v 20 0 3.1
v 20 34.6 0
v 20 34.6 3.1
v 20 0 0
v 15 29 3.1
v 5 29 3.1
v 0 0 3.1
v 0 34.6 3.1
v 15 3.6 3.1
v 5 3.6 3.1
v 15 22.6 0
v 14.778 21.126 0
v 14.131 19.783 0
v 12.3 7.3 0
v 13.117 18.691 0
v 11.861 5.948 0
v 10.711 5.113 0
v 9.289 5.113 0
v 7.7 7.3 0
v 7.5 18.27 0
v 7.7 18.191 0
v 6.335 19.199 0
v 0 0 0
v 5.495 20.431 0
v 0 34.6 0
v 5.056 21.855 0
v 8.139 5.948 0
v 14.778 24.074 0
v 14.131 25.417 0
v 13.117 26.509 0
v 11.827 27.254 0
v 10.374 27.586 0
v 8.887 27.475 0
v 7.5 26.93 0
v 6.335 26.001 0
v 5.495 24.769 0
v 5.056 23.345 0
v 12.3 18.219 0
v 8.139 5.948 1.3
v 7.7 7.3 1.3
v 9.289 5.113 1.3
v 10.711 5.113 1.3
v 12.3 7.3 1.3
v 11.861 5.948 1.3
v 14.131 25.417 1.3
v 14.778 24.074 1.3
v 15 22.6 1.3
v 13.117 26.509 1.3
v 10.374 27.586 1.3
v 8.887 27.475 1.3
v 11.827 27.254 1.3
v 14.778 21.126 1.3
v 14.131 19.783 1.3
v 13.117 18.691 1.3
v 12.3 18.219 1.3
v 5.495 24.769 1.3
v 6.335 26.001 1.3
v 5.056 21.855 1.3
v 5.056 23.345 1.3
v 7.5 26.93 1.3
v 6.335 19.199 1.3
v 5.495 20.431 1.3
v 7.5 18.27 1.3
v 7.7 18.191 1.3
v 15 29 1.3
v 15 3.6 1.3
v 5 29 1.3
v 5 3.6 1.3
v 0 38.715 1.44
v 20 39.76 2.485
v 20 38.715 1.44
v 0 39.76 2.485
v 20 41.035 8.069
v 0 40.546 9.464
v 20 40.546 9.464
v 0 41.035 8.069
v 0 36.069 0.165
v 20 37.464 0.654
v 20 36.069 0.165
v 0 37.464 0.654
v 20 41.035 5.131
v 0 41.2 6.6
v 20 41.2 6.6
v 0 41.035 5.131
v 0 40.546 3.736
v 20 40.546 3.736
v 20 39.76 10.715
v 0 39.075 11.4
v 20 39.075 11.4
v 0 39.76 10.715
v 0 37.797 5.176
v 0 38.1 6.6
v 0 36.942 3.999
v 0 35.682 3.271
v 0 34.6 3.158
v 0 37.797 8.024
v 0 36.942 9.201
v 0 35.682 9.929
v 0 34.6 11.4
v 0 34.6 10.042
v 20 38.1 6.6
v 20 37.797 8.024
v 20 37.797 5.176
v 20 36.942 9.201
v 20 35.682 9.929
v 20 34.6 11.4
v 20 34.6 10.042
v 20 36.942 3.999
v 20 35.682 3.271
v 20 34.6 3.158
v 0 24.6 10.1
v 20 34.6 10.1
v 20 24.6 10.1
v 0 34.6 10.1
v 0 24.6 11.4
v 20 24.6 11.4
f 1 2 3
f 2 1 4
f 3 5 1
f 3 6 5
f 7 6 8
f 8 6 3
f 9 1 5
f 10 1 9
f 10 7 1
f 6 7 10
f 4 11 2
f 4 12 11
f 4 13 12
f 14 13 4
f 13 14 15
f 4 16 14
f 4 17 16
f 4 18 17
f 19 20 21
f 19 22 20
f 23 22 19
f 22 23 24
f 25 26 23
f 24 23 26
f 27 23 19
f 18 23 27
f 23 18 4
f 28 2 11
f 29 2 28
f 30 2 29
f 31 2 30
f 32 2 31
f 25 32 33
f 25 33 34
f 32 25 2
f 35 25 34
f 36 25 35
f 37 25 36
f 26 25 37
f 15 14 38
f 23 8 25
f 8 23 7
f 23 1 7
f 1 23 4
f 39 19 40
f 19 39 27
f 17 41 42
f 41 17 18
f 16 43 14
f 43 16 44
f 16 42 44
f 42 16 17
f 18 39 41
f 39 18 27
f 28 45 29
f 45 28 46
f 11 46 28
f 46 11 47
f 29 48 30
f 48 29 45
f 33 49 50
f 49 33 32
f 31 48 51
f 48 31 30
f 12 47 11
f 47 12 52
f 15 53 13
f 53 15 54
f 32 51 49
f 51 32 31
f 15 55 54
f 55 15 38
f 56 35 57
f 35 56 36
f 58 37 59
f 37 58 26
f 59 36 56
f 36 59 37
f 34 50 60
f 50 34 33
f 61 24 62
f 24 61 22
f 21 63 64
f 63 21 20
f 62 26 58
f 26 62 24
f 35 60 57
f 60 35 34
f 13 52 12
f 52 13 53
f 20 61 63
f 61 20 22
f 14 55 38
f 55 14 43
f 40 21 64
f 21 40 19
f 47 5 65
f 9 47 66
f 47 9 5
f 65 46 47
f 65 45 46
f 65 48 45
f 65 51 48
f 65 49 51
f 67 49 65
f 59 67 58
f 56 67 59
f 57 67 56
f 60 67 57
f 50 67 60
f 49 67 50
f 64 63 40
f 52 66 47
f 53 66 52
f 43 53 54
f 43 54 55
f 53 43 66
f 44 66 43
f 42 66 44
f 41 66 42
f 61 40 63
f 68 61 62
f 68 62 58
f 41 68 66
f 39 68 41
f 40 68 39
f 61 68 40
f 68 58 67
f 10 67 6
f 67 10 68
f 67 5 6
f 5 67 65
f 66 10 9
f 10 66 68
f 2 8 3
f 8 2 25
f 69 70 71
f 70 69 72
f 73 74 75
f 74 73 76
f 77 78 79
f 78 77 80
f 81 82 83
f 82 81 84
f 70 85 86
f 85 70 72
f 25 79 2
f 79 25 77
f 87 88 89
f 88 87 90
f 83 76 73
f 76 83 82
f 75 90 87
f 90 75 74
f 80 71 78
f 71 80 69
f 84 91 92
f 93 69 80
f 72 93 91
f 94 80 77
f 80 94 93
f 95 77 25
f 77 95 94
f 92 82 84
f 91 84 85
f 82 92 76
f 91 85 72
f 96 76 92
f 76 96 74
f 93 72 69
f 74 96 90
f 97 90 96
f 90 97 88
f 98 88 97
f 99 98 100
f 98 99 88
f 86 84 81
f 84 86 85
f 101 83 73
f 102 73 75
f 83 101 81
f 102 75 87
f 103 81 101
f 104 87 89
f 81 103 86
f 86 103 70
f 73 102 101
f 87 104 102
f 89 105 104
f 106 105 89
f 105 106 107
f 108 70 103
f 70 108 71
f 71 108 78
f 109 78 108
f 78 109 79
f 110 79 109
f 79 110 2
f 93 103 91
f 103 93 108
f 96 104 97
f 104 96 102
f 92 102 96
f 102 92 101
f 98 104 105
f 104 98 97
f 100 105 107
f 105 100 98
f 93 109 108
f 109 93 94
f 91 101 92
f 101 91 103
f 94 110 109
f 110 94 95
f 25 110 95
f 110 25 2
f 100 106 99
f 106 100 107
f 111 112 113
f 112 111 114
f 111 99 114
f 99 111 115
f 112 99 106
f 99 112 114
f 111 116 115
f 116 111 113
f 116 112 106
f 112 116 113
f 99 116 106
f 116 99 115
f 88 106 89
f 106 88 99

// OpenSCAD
//all measurements in mm

// quality settings
fs=1.5; // cylinder circumferential length of each side

// lock portion shaped like:
//
// +----->
// |     x
// v y
//   ___
//  /   \
// |     | lock_open_radius
//  \   /
//   | |
//   | | lock_height
//   | |
//   \_/ lock_radius

// V2 has lock_offset_y = 6 for the side bracket, 60 for the top/bottom brackets
// V3 has lock_offset_y = 2 for the side bracket, 45 for the top/bottom brackets
lock_offset_y    = 2;
lock_radius      = 2.3;
lock_height      = 8;
lock_open_radius = 5;
// thickness of lock portion
lock_depth       = 3.1;
// thickness of portion that has to close inside lapdock
lock_depth_inner = 1.3;
// padding to allow for the screw head fitting between lock and LCD
screw_head_depth = 1.8;
screw_head_rad   = 3.7;
lock_pad_x       = 5;
lock_pad_y       = 5;
// thickness of the lapdock LCD
screen_depth     = 7;
clip_height      = 10;

plate_w = 2*lock_open_radius+2*lock_pad_x;
plate_l = 2*lock_open_radius+lock_height+2*lock_radius+2*lock_pad_y;

module lock_plate()
{
    screw_head_overhang = screw_head_rad-lock_radius;
    difference() {
        cube([plate_w, plate_l, lock_depth]);
        translate([plate_w/2,lock_pad_y+lock_radius,-1])
            cylinder($fs=fs, h=lock_depth+2, r=lock_radius);
        translate([plate_w/2,plate_l-lock_pad_y-lock_open_radius,-1]) 
            cylinder($fs=fs, h=lock_depth+2, r=lock_open_radius);
        translate([plate_w/2-lock_radius,lock_pad_y+lock_radius,-1])
            cube([2*lock_radius, lock_height+lock_radius+lock_open_radius, lock_depth+2]);
        translate([lock_pad_x, lock_pad_y-screw_head_overhang, lock_depth-screw_head_depth])
            cube([lock_open_radius*2, lock_height+2*lock_radius+2*lock_open_radius+2*screw_head_overhang, screw_head_depth+1]);
    }
    translate([0, plate_l, 0]) cube([plate_w, lock_offset_y, lock_depth]);
}

module clip()
{
    outer_rad = screen_depth/2+lock_depth;
    inner_rad = screen_depth/2;
    difference() {
        union() {
            translate([0,plate_l+lock_offset_y,outer_rad]) difference() {
                rotate([90, 0, 90]) difference() {
                    cylinder($fs=fs, h=plate_w, r=screen_depth/2+lock_depth);
                    translate([0,0,-1]) cylinder($fs=fs, h=plate_w+2, r=inner_rad);
                }
                translate([-1,-outer_rad,-outer_rad]) cube([plate_w+2, outer_rad, outer_rad*2]);
            }
            translate([0, plate_l+lock_offset_y, 2*outer_rad])
            rotate([180, 0, 0])
                cube([plate_w, clip_height, lock_depth]);
        }
        // cut off the top portion of the clip so the lapdock can close
        translate([-1, -1000, outer_rad+inner_rad+lock_depth_inner]) cube([plate_w+2, 2000, lock_depth]);
    }
}

module vesa_clip()
{
	union() {
		lock_plate();
        clip();
	}
}

vesa_clip();
